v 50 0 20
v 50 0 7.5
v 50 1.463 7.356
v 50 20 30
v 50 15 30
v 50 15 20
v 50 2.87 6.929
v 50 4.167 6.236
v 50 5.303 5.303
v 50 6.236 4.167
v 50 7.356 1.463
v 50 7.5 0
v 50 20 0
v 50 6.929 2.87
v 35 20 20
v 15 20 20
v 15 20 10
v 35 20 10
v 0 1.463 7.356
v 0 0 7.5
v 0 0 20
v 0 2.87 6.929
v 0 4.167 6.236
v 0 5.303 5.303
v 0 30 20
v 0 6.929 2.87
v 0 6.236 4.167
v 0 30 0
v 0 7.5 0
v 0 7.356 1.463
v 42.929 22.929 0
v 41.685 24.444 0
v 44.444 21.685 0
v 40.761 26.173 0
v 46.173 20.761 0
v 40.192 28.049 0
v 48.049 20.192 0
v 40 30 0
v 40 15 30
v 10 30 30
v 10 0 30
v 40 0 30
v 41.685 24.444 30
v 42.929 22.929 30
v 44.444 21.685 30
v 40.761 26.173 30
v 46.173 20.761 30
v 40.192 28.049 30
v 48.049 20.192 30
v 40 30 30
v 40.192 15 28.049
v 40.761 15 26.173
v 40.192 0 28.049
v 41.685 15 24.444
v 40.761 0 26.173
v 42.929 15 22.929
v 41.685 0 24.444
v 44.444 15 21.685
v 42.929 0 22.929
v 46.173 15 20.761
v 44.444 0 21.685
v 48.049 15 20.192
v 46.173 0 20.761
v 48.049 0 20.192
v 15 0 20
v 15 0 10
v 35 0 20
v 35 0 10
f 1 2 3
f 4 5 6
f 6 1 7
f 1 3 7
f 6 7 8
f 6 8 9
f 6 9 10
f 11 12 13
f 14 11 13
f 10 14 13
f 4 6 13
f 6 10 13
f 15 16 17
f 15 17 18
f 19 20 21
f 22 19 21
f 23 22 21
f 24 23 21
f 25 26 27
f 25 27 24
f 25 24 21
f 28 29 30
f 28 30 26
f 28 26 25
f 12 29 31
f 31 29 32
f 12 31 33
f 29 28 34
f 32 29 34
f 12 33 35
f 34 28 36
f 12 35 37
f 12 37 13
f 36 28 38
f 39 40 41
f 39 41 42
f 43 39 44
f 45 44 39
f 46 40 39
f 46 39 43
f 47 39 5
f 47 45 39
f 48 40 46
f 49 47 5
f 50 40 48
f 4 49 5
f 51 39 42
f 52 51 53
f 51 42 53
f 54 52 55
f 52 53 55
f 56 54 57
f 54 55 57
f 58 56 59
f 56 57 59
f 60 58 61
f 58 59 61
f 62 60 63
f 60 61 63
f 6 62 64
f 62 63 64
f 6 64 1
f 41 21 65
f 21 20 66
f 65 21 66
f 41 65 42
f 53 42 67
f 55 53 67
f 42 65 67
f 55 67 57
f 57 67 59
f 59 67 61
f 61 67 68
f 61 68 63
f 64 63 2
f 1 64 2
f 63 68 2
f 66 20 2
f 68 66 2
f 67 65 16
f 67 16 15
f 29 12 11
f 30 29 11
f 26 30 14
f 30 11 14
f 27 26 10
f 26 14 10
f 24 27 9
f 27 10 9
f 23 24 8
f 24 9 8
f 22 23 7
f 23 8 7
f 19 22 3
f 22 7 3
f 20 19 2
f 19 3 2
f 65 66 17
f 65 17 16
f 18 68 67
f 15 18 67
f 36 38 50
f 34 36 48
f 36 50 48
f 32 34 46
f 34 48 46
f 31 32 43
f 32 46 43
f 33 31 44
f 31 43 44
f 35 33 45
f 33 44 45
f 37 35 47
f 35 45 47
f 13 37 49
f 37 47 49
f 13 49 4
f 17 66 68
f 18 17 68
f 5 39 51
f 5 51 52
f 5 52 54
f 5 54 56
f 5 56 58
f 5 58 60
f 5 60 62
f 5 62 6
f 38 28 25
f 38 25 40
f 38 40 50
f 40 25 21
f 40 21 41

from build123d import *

# Parameters (mm, degrees)
F0_W      = 50
F0_H      = 30
F1_DEPTH  = 30
F3_DEPTH  = 30.001
F4_R      = 10
F5_DEPTH  = 15
F6_W      = 20
F6_H      = 10
F7_DEPTH  = 20
F8_R      = 7.5
F9_DEPTH  = 50.001
F10_R     = 10
F11_DEPTH = 30.001


with BuildPart() as f1:
    # F0 (on Top) → F1 (new body)
    with BuildSketch(Plane.XY):
        with Locations((25, 15)):
            Rectangle(F0_W, F0_H)
    extrude(amount=F1_DEPTH)

    # F2 (on face) → F3 (cut, through all)
    with BuildSketch(Plane.XZ):
        Polygon((10, 30), (0, 30), (0, 20), align=None)
    extrude(amount=-F3_DEPTH, mode=Mode.SUBTRACT)

    # F4 (on face) → F5 (cut)
    with BuildSketch(Plane.XZ):
        with Locations((50, 30)):
            Circle(F4_R)
    extrude(amount=-F5_DEPTH, mode=Mode.SUBTRACT)

    # F6 (on face) → F7 (cut)
    with BuildSketch(Plane.XZ):
        with Locations((25, 15)):
            Rectangle(F6_W, F6_H)
    extrude(amount=-F7_DEPTH, mode=Mode.SUBTRACT)

    # F8 (on face) → F9 (cut, through all)
    with BuildSketch(Plane.YZ.offset(50)):
        Circle(F8_R)
    extrude(amount=-F9_DEPTH, mode=Mode.SUBTRACT)

    # F10 (on face) → F11 (cut, through all)
    with BuildSketch(Plane.XY.offset(30)):
        with Locations((50, 30)):
            Circle(F10_R)
    extrude(amount=-F11_DEPTH, mode=Mode.SUBTRACT)


solid = f1.part
